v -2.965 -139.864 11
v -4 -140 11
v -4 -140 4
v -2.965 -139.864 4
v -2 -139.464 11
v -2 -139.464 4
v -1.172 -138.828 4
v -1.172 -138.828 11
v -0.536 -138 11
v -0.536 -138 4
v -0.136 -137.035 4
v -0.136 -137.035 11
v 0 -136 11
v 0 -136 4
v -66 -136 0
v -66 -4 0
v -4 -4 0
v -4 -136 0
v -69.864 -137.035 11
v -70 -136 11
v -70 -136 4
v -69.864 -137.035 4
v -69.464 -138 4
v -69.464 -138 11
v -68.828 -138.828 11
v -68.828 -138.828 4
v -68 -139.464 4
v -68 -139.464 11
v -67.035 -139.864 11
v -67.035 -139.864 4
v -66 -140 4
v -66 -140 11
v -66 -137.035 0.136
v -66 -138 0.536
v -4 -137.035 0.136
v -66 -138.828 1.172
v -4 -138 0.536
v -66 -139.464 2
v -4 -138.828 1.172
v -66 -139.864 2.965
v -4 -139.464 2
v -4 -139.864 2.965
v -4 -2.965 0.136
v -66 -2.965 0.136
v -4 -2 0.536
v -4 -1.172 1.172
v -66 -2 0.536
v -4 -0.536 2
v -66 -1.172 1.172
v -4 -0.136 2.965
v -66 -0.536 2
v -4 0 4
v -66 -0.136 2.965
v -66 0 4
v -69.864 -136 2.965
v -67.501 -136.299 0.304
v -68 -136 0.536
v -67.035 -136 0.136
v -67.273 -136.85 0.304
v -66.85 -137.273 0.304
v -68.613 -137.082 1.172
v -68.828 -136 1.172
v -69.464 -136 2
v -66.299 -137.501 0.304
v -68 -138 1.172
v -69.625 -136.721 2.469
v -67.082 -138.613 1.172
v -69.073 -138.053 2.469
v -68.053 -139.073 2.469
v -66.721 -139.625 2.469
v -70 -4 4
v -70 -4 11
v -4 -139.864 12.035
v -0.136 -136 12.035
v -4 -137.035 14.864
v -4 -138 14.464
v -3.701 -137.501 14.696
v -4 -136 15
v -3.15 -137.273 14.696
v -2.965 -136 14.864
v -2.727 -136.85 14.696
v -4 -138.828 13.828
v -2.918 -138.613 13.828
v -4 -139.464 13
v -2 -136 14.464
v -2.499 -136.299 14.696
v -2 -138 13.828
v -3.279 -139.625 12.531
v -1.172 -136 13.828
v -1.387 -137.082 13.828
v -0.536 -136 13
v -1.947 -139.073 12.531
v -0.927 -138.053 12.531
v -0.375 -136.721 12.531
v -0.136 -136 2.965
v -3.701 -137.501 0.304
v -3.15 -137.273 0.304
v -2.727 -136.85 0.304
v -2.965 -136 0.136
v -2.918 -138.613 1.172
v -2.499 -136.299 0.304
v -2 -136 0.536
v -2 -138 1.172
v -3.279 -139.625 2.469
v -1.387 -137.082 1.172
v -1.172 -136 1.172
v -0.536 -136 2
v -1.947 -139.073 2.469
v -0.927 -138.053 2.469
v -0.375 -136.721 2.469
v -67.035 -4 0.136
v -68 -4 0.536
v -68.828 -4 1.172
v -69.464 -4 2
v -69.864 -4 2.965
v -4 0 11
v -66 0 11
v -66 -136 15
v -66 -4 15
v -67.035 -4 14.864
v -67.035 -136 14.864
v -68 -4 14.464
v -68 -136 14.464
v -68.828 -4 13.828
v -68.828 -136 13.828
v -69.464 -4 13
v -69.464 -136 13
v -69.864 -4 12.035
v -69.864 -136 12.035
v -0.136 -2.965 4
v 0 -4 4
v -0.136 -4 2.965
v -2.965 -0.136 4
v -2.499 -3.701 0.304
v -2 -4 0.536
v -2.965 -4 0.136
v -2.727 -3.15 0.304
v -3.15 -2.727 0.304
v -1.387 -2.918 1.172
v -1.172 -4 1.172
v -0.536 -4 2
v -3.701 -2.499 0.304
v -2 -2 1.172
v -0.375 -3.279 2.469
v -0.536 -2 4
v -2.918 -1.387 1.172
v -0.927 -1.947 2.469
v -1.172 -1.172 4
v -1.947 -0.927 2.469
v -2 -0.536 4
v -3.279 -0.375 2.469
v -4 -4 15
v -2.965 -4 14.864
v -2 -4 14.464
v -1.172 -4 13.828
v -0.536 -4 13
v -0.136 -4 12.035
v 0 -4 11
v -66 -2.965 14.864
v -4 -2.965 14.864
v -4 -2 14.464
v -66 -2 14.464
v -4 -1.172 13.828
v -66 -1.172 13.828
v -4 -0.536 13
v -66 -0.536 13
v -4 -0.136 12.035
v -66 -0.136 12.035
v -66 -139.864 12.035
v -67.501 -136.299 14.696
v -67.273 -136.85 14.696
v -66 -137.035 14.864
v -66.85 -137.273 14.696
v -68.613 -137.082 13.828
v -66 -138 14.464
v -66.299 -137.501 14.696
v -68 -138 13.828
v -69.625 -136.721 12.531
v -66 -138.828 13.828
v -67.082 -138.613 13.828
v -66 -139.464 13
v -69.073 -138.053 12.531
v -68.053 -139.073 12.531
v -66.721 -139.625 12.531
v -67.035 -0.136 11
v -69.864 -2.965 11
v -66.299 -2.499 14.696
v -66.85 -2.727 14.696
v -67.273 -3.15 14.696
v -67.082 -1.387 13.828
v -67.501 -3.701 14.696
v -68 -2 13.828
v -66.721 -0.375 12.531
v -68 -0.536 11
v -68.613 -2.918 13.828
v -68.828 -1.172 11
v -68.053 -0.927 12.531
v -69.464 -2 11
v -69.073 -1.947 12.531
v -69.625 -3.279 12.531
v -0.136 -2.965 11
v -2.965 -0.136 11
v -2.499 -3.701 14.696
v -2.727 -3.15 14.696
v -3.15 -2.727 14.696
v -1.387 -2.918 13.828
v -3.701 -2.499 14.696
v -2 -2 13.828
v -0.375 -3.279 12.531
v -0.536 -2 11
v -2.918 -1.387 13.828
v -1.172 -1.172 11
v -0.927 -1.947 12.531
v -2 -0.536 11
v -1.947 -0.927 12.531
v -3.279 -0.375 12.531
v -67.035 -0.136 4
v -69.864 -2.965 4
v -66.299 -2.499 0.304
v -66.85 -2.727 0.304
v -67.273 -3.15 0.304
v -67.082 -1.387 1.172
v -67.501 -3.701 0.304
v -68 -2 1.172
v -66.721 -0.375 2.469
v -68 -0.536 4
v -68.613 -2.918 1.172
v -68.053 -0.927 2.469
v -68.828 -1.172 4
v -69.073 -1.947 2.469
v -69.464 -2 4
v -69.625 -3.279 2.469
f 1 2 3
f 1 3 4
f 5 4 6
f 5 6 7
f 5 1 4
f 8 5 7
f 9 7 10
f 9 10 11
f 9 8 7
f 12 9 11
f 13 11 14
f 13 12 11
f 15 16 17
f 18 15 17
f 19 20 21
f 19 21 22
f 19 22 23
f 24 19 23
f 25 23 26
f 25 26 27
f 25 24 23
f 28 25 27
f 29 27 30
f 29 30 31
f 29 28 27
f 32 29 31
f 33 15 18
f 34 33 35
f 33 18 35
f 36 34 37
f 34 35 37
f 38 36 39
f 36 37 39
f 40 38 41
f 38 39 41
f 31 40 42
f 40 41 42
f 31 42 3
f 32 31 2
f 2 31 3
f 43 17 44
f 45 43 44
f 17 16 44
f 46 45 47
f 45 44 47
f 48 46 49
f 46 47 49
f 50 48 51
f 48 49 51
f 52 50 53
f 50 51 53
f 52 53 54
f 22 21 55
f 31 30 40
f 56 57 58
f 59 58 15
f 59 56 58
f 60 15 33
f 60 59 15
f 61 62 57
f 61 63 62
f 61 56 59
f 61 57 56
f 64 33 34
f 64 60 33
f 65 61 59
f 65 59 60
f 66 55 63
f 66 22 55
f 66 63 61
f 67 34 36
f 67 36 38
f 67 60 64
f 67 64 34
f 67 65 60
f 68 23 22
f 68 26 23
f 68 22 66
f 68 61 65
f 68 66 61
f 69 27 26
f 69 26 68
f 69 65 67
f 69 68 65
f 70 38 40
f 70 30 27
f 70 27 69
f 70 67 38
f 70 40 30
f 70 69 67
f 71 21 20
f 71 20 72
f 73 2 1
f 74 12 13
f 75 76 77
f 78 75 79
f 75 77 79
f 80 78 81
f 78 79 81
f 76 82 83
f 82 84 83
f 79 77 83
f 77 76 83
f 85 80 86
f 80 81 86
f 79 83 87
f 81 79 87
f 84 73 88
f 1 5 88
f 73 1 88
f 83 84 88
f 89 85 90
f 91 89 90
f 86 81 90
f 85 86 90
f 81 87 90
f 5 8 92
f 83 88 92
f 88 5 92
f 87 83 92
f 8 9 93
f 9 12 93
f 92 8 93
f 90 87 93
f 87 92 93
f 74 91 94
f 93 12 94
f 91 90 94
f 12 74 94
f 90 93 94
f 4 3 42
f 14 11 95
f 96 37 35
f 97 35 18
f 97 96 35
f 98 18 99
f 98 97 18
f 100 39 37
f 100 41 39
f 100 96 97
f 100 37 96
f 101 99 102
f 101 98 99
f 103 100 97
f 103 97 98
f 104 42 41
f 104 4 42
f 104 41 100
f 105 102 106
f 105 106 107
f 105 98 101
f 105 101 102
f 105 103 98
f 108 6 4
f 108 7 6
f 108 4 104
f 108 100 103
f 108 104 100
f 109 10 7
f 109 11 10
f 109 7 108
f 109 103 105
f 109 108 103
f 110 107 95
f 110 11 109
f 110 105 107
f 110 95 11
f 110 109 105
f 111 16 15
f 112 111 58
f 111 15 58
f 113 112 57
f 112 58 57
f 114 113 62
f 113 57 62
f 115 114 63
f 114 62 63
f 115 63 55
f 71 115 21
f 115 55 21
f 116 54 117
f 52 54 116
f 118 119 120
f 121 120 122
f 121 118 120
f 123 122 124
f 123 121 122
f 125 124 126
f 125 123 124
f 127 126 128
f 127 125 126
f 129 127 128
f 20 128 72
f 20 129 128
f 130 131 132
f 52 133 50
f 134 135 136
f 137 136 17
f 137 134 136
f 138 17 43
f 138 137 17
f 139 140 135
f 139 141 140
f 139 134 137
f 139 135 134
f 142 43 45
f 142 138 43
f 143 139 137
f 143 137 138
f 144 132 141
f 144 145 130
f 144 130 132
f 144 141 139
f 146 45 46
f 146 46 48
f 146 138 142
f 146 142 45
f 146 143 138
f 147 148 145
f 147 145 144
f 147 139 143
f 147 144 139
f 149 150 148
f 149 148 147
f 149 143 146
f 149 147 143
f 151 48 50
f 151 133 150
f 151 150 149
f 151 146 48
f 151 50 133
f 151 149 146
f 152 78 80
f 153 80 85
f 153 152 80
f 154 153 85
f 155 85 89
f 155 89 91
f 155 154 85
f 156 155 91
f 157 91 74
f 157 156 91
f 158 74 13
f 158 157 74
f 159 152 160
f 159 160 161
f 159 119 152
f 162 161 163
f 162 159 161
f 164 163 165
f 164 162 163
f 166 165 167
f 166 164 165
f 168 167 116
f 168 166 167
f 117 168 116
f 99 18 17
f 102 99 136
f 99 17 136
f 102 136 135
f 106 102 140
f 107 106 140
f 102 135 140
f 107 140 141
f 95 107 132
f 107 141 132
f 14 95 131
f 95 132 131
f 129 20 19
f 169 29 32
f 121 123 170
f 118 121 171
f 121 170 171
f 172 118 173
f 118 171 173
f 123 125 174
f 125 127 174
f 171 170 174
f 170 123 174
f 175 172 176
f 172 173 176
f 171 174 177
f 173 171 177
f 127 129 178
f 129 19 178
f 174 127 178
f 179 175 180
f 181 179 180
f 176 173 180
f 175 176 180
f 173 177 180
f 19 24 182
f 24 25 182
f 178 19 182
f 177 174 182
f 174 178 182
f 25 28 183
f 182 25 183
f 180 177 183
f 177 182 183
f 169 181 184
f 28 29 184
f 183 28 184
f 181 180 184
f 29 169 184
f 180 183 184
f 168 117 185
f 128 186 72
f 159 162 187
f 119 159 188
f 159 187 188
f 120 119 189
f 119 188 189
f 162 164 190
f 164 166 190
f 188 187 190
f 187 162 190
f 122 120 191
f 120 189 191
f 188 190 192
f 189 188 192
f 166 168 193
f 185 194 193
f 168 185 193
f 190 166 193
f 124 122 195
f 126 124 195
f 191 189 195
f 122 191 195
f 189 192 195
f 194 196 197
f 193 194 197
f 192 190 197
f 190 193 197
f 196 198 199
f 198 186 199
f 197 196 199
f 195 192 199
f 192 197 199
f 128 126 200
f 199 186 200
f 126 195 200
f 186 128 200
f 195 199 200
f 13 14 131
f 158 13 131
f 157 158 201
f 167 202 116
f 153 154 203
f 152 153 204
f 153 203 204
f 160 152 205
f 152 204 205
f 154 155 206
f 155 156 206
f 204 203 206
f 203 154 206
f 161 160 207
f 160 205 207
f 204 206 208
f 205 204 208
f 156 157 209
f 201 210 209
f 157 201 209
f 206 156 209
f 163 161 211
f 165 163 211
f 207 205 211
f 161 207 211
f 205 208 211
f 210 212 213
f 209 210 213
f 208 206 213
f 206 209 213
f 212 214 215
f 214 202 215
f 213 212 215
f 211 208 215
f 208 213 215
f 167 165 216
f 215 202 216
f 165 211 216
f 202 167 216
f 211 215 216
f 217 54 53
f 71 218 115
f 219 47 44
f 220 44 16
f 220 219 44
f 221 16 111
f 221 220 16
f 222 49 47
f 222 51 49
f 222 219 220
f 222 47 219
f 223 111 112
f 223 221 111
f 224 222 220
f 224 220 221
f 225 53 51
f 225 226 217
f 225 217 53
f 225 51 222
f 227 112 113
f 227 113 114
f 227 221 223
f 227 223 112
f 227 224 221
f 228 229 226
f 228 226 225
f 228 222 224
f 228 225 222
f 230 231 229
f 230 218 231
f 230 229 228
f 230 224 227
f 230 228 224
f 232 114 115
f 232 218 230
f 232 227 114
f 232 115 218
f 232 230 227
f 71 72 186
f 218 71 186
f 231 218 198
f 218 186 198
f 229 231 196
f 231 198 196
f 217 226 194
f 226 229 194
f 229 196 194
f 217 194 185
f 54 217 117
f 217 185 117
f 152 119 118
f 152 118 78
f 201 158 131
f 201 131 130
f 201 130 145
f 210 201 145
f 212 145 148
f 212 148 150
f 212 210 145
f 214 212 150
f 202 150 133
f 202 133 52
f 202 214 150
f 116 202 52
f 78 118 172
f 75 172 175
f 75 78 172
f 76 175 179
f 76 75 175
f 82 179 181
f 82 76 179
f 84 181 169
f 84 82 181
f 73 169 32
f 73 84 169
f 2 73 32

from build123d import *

# Parameters (mm, degrees)
ESQUISSE1_W        = 70
ESQUISSE1_H        = 140
BOSS_EXTRU_1_DEPTH = 15
CONG_1_R           = 4
CONG_2_R           = 4
CONG_3_R           = 4


with BuildPart() as part:
    # Esquisse1 → Boss.-Extru.1 (new body)
    with BuildSketch(Plane.XY):
        with Locations((-35, -70)):
            Rectangle(ESQUISSE1_W, ESQUISSE1_H)
    extrude(amount=BOSS_EXTRU_1_DEPTH)

    # Congé1
    cong_1_edges = [part.edges().sort_by_distance(p)[0] for p in [
        (0, -140, 7.5),
        (-70, -140, 7.5),
        (-70, 0, 7.5),
        (0, 0, 7.5),
    ]]
    fillet(cong_1_edges, radius=CONG_1_R)

    # Congé2
    cong_2_edges = [part.edges().sort_by_distance(p)[0] for p in [
        (0, -70, 15),
        (-35, -140, 15),
        (-35, 0, 15),
        (-70, -70, 15),
        (-1.171572875, -1.171572875, 15),
        (-68.828427125, -1.171572875, 15),
        (-68.828427125, -138.828427125, 15),
        (-1.171572875, -138.828427125, 15),
    ]]
    fillet(cong_2_edges, radius=CONG_2_R)

    # Congé3
    cong_3_edges = [part.edges().sort_by_distance(p)[0] for p in [
        (0, -70, 0),
        (-35, -140, 0),
        (-70, -70, 0),
        (-35, 0, 0),
        (-1.171572875, -1.171572875, 0),
        (-68.828427125, -1.171572875, 0),
        (-68.828427125, -138.828427125, 0),
        (-1.171572875, -138.828427125, 0),
    ]]
    fillet(cong_3_edges, radius=CONG_3_R)


solid = part.part
